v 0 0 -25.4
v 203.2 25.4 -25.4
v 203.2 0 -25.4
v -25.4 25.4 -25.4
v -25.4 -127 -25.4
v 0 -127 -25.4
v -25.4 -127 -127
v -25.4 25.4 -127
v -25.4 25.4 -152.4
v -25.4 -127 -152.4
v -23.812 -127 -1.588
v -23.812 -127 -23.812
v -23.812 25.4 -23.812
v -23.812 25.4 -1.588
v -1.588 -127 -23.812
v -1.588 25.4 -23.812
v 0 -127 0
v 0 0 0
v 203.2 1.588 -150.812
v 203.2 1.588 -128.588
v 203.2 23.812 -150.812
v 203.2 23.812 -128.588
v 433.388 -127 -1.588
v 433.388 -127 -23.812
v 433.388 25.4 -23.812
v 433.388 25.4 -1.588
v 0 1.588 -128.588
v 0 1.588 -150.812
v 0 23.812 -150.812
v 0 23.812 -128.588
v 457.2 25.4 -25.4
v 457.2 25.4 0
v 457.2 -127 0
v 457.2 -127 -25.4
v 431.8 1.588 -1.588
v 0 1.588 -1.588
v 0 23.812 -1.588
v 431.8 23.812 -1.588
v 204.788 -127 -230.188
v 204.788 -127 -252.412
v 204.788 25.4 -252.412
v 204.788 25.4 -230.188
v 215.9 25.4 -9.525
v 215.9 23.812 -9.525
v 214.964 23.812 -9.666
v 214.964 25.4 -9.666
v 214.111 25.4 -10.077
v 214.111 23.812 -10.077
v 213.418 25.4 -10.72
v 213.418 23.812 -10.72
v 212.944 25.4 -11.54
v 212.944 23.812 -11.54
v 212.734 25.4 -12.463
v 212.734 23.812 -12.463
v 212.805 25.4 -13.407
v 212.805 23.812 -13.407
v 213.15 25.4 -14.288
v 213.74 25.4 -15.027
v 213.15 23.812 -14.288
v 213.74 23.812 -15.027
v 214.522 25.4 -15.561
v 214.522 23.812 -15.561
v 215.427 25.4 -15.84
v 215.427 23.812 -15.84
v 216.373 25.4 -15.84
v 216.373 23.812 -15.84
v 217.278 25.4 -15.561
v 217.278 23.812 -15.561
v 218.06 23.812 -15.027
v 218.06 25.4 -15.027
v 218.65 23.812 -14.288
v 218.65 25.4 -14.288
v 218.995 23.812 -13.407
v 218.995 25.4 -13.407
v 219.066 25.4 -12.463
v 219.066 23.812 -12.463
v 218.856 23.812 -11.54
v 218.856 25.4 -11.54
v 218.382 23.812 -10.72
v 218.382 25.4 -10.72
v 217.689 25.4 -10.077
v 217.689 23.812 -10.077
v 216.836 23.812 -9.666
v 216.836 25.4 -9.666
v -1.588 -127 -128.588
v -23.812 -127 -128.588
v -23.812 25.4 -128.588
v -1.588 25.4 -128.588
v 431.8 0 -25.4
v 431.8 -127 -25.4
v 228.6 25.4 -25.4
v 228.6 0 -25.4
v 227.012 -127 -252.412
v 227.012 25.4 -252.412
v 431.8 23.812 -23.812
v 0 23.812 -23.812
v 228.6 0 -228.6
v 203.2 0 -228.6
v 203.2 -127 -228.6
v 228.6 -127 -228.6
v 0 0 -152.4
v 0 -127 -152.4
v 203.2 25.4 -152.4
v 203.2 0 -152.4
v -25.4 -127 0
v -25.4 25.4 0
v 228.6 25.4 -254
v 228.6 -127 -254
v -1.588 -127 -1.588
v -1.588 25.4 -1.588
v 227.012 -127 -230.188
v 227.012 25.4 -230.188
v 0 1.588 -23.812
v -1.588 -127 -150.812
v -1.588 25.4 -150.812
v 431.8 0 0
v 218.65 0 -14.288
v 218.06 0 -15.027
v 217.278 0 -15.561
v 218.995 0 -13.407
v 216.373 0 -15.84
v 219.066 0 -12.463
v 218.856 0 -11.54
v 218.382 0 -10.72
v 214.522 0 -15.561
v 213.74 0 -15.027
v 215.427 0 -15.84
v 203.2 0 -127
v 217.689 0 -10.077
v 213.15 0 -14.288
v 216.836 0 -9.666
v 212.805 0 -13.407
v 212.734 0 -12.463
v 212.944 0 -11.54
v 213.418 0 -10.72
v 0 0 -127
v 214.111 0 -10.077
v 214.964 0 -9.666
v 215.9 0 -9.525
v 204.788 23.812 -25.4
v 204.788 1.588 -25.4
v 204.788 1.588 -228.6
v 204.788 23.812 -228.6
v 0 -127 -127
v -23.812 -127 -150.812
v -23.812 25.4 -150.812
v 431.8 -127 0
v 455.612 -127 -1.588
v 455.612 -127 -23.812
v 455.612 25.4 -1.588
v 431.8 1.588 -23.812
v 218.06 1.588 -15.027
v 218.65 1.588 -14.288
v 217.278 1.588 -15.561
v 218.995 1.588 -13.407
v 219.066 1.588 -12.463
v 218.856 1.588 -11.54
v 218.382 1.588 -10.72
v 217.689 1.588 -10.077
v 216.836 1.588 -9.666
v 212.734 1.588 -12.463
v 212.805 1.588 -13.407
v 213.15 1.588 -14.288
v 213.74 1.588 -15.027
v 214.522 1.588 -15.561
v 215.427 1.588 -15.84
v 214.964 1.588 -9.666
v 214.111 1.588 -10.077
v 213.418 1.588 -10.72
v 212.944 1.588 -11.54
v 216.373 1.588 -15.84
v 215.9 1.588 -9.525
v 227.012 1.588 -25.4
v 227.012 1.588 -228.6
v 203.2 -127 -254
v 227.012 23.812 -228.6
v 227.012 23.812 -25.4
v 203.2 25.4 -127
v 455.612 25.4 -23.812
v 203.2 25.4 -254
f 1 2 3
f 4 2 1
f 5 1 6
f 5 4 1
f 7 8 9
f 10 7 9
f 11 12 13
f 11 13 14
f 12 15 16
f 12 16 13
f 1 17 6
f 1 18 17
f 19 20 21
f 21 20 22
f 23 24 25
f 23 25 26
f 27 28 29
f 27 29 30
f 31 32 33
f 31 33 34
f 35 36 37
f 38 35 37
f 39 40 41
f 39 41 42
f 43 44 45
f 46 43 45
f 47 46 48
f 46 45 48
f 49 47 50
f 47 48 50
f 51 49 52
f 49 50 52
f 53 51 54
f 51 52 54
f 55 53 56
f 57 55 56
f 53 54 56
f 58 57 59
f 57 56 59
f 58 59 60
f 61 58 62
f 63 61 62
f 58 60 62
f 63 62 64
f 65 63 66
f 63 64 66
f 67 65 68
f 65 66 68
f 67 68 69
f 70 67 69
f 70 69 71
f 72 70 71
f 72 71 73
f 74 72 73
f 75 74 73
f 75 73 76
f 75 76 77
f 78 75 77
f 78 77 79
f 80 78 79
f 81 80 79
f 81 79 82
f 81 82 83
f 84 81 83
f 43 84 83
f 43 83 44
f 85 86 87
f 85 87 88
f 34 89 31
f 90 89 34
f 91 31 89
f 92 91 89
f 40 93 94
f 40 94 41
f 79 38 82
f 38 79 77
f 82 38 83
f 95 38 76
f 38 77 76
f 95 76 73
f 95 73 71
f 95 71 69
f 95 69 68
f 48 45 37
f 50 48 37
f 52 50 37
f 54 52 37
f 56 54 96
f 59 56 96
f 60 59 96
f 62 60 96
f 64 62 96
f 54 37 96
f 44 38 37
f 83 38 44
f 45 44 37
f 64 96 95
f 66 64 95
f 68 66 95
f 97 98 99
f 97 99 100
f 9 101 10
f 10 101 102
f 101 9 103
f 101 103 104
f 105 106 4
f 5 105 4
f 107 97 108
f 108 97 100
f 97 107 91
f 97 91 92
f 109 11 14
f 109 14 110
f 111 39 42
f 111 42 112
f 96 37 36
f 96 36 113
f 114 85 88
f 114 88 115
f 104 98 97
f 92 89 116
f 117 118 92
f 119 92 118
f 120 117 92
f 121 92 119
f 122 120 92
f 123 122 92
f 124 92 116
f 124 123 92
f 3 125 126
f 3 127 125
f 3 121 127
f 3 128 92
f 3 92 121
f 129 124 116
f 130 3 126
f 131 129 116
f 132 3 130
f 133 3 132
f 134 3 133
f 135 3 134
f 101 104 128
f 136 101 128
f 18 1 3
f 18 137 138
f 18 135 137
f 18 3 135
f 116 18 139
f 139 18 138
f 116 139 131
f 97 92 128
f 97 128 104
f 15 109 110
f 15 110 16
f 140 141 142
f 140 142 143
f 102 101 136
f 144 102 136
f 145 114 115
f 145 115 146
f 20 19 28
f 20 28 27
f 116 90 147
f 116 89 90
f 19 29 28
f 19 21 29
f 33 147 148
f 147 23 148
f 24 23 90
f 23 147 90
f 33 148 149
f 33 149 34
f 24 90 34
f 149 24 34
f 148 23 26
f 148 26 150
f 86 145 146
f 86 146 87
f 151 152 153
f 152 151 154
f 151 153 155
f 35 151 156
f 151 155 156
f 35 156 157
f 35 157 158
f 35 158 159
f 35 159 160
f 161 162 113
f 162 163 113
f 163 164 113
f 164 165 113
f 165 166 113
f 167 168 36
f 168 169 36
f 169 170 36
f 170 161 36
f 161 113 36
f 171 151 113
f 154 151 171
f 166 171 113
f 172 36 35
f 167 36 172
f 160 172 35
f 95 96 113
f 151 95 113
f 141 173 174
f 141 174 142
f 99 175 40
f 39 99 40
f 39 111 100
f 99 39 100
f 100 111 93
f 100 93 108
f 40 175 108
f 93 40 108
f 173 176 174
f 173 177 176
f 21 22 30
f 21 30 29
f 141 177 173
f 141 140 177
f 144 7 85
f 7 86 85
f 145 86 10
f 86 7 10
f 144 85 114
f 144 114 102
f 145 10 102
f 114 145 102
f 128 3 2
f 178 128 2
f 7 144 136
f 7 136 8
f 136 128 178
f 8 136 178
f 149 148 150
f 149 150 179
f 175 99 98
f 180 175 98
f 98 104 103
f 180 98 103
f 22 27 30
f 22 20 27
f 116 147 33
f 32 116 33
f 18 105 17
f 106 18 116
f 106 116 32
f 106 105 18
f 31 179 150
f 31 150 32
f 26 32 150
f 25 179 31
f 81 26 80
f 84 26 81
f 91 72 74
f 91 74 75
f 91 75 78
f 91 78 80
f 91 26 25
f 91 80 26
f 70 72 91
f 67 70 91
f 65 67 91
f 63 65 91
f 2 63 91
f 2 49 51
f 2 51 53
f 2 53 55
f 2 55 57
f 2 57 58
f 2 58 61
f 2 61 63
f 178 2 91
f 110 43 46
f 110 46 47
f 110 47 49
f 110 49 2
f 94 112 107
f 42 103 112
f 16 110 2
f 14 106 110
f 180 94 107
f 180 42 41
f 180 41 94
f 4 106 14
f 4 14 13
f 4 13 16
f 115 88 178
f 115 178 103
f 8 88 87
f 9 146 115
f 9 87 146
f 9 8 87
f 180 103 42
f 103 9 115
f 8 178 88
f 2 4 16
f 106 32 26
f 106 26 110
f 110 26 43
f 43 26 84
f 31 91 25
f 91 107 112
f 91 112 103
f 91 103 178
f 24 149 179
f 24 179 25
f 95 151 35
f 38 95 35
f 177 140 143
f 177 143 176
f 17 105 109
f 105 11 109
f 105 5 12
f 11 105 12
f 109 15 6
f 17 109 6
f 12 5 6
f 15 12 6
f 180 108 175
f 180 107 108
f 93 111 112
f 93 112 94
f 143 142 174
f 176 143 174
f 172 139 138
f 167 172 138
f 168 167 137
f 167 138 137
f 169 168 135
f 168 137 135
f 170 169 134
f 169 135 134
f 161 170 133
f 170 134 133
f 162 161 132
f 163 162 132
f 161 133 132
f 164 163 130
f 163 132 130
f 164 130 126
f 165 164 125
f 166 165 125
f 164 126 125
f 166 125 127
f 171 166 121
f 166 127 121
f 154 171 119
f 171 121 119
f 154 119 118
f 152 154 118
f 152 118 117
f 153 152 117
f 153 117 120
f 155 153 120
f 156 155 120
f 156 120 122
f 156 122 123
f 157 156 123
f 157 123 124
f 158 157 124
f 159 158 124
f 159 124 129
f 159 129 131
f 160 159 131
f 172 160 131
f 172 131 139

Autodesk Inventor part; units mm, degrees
ref_plane "YZ Plane" through (0, 0, 0) normal (1, 0, 0) x (0, 1, 0)
ref_plane "XZ Plane" through (0, 0, 0) normal (0, 1, 0) x (-1, 0, 0)
ref_plane "XY Plane" through (0, 0, 0) normal (0, 0, 1) x (1, 0, 0)
sketch "Sketch1" plane through (0, 0, 0) normal (1, 0, 0) x (0, 1, 0)
  line L0 (0, 0) -> (25.4, 0)
  line L1 (25.4, 0) -> (25.4, -25.4)
  line L2 (25.4, -25.4) -> (0, -25.4)
  line L3 (0, -25.4) -> (0, 0)
  line L4 (1.5875, -1.5875) -> (23.8125, -1.5875)
  line L5 (23.8125, -1.5875) -> (23.8125, -23.8125)
  line L6 (23.8125, -23.8125) -> (1.5875, -23.8125)
  line L7 (1.5875, -23.8125) -> (1.5875, -1.5875)
  dimension "d0" = 25.4
  dimension "d1" = 1.5875
  dimension "d2" = 1.5875
  dimension "d3" = 1.5875
  dimension "d4" = 1.5875
extrude "Extrusion1" add sketch "Sketch1" along normal blind 431.8
sketch "Sketch2" plane through (0, 0, -25.4) normal (0, 0, -1) x (-1, 0, 0)
  line L0 (0, 25.4) -> (0, 0) projected
  line L1 (0, 25.4) -> (-431.8, 25.4) projected
  line L2 (0, 0) -> (-431.8, 0) construction
  line L3 (-228.6, 0) -> (-203.2, 0)
  line L4 (-203.2, 0) -> (-203.2, 25.4)
  line L5 (-203.2, 25.4) -> (-228.6, 25.4)
  line L6 (-228.6, 25.4) -> (-228.6, 0)
  line L7 (-215.9, 25.4) -> (-215.9, 0) construction
  line L8 (-227.0125, 1.5875) -> (-204.7875, 1.5875)
  line L9 (-204.7875, 1.5875) -> (-204.7875, 23.8125)
  line L10 (-204.7875, 23.8125) -> (-227.0125, 23.8125)
  line L11 (-227.0125, 23.8125) -> (-227.0125, 1.5875)
  line L12 (-227.0125, 1.5875) -> (-204.7875, 23.8125) construction
  line L13 (-204.7875, 1.5875) -> (-227.0125, 23.8125) construction
  point P0 (-215.9, 12.7)
  dimension "d7" = 25.4
  dimension "d9" = 12.7
  dimension "d10" = 215.9
  dimension "d11" = 1.5875
  dimension "d12" = 1.5875
  dimension "d13" = 1.5875
  dimension "d14" = 1.5875
extrude "Extrusion2" add sketch "Sketch2" along normal blind 203.2
sketch "Sketch3" plane through (203.2, 0, -25.4) normal (-1, 0, 0) x (0, 0, 1)
  line L0 (0, 25.4) -> (0, 0) projected
  line L1 (0, 25.4) -> (-203.2, 25.4) projected
  line L2 (0, 0) -> (-203.2, 0) projected
  line L3 (-127, 0) -> (-101.6, 0)
  line L4 (-101.6, 0) -> (-101.6, 25.4)
  line L5 (-101.6, 25.4) -> (-127, 25.4)
  line L6 (-127, 25.4) -> (-127, 0)
  line L7 (-114.3, 25.4) -> (-114.3, 0) construction
  line L8 (-125.4125, 1.5875) -> (-103.1875, 1.5875)
  line L9 (-103.1875, 1.5875) -> (-103.1875, 23.8125)
  line L10 (-103.1875, 23.8125) -> (-125.4125, 23.8125)
  line L11 (-125.4125, 23.8125) -> (-125.4125, 1.5875)
  point P0 (25.4, 0)
  dimension "d17" = 25.4
  dimension "d19" = 12.7
  dimension "d20" = 114.3
  dimension "d21" = 1.5875
  dimension "d22" = 1.5875
  dimension "d23" = 1.5875
  dimension "d24" = 1.5875
extrude "Extrusion3" add sketch "Sketch3" along normal blind 203.2 contours L4 L2 L6 L1
sketch "Sketch4" plane through (0, 25.4, 0) normal (0, 1, 0) x (1, 0, 0)
  line L0 (0, 0) -> (0, 25.4) projected
  line L1 (431.8, 25.4) -> (431.8, 0) projected
  line L2 (203.2, 228.6) -> (228.6, 228.6) projected
  line L3 (0, 127) -> (-25.4, 127)
  line L4 (-25.4, 127) -> (-25.4, 152.4)
  line L5 (-25.4, 152.4) -> (0, 152.4)
  line L6 (0, 152.4) -> (0, 127)
  line L7 (0, 0) -> (-25.4, 0)
  line L8 (-25.4, 0) -> (-25.4, 25.4)
  line L9 (-25.4, 25.4) -> (0, 25.4)
  line L10 (0, 25.4) -> (0, 0)
  line L11 (431.8, 0) -> (457.2, 0)
  line L12 (457.2, 0) -> (457.2, 25.4)
  line L13 (457.2, 25.4) -> (431.8, 25.4)
  line L14 (431.8, 25.4) -> (431.8, 0)
  line L15 (203.2, 228.6) -> (206.375, 228.6)
  line L16 (-23.8125, 128.5875) -> (-1.5875, 128.5875)
  line L17 (-1.5875, 128.5875) -> (-1.5875, 150.8125)
  line L18 (-1.5875, 150.8125) -> (-23.8125, 150.8125)
  line L19 (-23.8125, 150.8125) -> (-23.8125, 128.5875)
  line L20 (-23.8125, 1.5875) -> (-1.5875, 1.5875)
  line L21 (-1.5875, 1.5875) -> (-1.5875, 23.8125)
  line L22 (-1.5875, 23.8125) -> (-23.8125, 23.8125)
  line L23 (-23.8125, 23.8125) -> (-23.8125, 1.5875)
  line L24 (204.7875, 234.8076) -> (204.7875, 234.8076)
  line L25 (433.3875, 1.5875) -> (455.6125, 1.5875)
  line L26 (455.6125, 1.5875) -> (455.6125, 23.8125)
  line L27 (455.6125, 23.8125) -> (433.3875, 23.8125)
  line L28 (433.3875, 23.8125) -> (433.3875, 1.5875)
  line L29 (203.2, 228.6) -> (228.6, 228.6)
  line L30 (228.6, 228.6) -> (228.6, 254)
  line L31 (228.6, 254) -> (203.2, 254)
  line L32 (203.2, 254) -> (203.2, 228.6)
  line L33 (204.7875, 230.1875) -> (227.0125, 230.1875)
  line L34 (227.0125, 230.1875) -> (227.0125, 252.4125)
  line L35 (227.0125, 252.4125) -> (204.7875, 252.4125)
  line L36 (204.7875, 252.4125) -> (204.7875, 230.1875)
  dimension "d27" = 25.4
  dimension "d28" = 25.4
  dimension "d29" = 25.4
  dimension "d33" = 25.4
  dimension "d34" = 25.4
  dimension "d35" = 1.5875
  dimension "d36" = 1.5875
  dimension "d37" = 1.5875
  dimension "d39" = 1.5875
  dimension "d40" = 1.5875
  dimension "d41" = 1.5875
  dimension "d42" = 1.5875
  dimension "d43" = 1.5875
  dimension "d44" = 1.5875
  dimension "d45" = 1.5875
  dimension "d46" = 1.5875
  dimension "d47" = 1.5875
  dimension "d48" = 1.5875
  dimension "d49" = 1.5875
  dimension "d50" = 1.5875
  dimension "d51" = 1.5875
extrude "Extrusion4" add sketch "Sketch4" against normal blind 152.4
sketch "Sketch5" plane through (203.2, 25.4, -25.4) normal (0, 1, 0) x (1, 0, 0)
  line L0 (-228.6, -25.4) -> (254, -25.4) projected
  line L1 (228.6, -23.8125) -> (228.6, -1.5875) projected
  point P0 (-203.2, -25.4)
  point P1 (12.7, -12.7)
  dimension "d54" = 12.7
  dimension "d55" = 215.9
hole "Hole1" at (215.9, 25.4, -12.7) direction (0, -1, 0) diameter 6.35 depth 25.4 tip angle 118
properties part number "TopSupportV3"
